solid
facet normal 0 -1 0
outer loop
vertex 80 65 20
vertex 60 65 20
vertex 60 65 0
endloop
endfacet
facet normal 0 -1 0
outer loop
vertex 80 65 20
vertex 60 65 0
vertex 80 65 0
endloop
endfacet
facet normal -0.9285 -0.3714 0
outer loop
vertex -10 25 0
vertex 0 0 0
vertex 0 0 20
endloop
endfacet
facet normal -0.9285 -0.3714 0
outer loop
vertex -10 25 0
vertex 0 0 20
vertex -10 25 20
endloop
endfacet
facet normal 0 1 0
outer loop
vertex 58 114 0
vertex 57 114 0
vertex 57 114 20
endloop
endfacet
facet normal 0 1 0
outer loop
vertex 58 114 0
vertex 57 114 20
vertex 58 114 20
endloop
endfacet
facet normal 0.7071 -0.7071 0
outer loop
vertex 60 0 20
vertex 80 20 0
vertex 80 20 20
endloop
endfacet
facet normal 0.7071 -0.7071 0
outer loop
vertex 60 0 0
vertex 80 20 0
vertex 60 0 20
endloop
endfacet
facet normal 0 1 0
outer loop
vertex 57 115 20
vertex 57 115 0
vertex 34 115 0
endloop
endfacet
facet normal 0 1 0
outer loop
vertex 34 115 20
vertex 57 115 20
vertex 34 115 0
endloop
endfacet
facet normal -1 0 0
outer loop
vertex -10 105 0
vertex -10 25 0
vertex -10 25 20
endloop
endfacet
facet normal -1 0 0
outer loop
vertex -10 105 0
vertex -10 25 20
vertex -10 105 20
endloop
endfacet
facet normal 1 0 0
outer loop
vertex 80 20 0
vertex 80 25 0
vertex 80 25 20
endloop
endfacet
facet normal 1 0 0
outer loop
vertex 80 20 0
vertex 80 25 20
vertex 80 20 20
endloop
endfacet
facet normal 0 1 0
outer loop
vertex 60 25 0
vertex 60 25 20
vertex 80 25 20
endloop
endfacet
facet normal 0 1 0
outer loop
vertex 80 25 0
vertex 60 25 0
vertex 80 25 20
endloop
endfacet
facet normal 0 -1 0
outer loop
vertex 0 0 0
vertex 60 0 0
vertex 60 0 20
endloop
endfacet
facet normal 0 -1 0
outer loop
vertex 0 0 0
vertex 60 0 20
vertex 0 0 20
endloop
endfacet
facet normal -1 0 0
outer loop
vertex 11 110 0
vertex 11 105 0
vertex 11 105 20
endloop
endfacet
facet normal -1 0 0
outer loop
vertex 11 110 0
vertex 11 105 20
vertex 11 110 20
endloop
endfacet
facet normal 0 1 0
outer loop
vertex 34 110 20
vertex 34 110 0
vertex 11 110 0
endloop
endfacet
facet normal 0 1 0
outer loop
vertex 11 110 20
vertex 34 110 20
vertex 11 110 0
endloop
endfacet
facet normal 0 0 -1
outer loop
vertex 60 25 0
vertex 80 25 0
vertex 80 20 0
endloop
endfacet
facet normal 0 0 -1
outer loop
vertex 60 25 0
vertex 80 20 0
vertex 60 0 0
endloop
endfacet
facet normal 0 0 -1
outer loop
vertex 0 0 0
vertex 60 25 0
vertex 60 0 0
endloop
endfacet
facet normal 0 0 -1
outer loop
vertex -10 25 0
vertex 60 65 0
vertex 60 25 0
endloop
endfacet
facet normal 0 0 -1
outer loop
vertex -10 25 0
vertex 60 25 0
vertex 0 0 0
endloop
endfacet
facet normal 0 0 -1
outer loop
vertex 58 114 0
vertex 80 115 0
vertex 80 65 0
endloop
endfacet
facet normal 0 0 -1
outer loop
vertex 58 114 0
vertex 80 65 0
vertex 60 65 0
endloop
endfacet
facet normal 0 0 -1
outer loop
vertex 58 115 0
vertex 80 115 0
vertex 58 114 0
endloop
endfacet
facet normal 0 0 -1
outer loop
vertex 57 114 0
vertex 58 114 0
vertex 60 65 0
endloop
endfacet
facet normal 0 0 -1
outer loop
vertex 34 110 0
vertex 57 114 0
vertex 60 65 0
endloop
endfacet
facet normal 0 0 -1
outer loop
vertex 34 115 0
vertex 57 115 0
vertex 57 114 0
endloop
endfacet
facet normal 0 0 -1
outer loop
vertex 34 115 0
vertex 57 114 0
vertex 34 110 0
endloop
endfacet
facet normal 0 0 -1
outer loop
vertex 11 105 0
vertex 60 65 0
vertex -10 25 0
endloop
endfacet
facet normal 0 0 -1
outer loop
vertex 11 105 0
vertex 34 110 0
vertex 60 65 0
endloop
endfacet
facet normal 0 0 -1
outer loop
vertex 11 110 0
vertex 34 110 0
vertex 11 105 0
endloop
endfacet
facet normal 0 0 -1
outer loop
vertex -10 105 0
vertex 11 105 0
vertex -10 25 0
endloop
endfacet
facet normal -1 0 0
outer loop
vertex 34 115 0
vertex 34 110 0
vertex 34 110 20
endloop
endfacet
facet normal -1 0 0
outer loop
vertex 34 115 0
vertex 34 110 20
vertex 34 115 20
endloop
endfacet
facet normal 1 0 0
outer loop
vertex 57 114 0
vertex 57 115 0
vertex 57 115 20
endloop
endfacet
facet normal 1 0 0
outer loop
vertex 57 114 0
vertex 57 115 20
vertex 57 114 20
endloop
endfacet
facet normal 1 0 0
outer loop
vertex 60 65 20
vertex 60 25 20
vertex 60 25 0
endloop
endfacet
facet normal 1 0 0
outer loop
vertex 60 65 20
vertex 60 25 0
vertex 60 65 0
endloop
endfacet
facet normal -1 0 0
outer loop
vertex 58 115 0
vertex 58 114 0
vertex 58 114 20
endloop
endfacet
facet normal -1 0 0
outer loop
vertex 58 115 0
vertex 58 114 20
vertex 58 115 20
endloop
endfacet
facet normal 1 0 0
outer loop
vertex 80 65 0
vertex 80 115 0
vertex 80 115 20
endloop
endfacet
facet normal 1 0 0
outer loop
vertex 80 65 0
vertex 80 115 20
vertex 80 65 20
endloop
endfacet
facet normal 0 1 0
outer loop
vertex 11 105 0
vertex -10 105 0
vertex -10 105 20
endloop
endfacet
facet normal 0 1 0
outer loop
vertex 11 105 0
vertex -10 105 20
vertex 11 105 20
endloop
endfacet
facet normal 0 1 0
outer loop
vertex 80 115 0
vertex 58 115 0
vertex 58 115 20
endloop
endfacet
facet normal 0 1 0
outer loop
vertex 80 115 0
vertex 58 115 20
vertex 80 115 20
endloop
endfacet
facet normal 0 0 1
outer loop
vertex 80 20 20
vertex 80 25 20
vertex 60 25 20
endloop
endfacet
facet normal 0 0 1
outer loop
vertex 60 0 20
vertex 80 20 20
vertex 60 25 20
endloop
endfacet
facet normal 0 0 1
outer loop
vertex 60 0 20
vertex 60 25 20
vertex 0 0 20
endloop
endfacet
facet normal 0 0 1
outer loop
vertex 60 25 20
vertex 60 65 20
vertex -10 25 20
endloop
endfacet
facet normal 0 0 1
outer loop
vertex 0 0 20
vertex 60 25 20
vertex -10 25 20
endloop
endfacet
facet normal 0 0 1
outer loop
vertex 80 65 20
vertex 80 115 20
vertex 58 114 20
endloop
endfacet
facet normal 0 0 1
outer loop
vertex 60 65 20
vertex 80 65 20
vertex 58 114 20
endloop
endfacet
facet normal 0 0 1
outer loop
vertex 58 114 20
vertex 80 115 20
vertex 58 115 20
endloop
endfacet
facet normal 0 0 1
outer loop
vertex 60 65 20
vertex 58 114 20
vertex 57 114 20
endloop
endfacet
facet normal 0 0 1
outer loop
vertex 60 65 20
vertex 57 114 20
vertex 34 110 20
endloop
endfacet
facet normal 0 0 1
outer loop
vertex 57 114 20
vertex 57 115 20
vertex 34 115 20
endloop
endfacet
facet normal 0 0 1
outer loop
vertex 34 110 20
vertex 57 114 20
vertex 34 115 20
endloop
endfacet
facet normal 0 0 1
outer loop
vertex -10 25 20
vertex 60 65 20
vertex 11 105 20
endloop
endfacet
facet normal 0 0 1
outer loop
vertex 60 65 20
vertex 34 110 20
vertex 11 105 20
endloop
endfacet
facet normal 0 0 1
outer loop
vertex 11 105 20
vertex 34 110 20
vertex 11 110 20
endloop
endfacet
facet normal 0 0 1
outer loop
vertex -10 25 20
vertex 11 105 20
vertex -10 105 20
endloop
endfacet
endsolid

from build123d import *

# Parameters (mm, degrees)
BOSS_EXTRUDE1_DEPTH = 20
SKETCH2_W           = 20
SKETCH2_H           = 40
CUT_EXTRUDE1_DEPTH  = 142.509716981


with BuildPart() as part:
    # Sketch1 → Boss-Extrude1 (new body)
    with BuildSketch(Plane.XY):
        Polygon((58, 114), (58, 115), (80, 115), (80, 20), (60, 0), (0, 0), (-10, 25), (-10, 105), (11, 105), (11, 110), (12, 110), (34, 110), (34, 115), (35, 115), (57, 115), (57, 114), align=None)
    extrude(amount=BOSS_EXTRUDE1_DEPTH)

    # Sketch2 → Cut-Extrude1 (cut, through all)
    with BuildSketch(Plane.XY.offset(20)):
        with Locations((70, 45)):
            Rectangle(SKETCH2_W, SKETCH2_H)
    extrude(amount=-CUT_EXTRUDE1_DEPTH, mode=Mode.SUBTRACT)


solid = part.part
